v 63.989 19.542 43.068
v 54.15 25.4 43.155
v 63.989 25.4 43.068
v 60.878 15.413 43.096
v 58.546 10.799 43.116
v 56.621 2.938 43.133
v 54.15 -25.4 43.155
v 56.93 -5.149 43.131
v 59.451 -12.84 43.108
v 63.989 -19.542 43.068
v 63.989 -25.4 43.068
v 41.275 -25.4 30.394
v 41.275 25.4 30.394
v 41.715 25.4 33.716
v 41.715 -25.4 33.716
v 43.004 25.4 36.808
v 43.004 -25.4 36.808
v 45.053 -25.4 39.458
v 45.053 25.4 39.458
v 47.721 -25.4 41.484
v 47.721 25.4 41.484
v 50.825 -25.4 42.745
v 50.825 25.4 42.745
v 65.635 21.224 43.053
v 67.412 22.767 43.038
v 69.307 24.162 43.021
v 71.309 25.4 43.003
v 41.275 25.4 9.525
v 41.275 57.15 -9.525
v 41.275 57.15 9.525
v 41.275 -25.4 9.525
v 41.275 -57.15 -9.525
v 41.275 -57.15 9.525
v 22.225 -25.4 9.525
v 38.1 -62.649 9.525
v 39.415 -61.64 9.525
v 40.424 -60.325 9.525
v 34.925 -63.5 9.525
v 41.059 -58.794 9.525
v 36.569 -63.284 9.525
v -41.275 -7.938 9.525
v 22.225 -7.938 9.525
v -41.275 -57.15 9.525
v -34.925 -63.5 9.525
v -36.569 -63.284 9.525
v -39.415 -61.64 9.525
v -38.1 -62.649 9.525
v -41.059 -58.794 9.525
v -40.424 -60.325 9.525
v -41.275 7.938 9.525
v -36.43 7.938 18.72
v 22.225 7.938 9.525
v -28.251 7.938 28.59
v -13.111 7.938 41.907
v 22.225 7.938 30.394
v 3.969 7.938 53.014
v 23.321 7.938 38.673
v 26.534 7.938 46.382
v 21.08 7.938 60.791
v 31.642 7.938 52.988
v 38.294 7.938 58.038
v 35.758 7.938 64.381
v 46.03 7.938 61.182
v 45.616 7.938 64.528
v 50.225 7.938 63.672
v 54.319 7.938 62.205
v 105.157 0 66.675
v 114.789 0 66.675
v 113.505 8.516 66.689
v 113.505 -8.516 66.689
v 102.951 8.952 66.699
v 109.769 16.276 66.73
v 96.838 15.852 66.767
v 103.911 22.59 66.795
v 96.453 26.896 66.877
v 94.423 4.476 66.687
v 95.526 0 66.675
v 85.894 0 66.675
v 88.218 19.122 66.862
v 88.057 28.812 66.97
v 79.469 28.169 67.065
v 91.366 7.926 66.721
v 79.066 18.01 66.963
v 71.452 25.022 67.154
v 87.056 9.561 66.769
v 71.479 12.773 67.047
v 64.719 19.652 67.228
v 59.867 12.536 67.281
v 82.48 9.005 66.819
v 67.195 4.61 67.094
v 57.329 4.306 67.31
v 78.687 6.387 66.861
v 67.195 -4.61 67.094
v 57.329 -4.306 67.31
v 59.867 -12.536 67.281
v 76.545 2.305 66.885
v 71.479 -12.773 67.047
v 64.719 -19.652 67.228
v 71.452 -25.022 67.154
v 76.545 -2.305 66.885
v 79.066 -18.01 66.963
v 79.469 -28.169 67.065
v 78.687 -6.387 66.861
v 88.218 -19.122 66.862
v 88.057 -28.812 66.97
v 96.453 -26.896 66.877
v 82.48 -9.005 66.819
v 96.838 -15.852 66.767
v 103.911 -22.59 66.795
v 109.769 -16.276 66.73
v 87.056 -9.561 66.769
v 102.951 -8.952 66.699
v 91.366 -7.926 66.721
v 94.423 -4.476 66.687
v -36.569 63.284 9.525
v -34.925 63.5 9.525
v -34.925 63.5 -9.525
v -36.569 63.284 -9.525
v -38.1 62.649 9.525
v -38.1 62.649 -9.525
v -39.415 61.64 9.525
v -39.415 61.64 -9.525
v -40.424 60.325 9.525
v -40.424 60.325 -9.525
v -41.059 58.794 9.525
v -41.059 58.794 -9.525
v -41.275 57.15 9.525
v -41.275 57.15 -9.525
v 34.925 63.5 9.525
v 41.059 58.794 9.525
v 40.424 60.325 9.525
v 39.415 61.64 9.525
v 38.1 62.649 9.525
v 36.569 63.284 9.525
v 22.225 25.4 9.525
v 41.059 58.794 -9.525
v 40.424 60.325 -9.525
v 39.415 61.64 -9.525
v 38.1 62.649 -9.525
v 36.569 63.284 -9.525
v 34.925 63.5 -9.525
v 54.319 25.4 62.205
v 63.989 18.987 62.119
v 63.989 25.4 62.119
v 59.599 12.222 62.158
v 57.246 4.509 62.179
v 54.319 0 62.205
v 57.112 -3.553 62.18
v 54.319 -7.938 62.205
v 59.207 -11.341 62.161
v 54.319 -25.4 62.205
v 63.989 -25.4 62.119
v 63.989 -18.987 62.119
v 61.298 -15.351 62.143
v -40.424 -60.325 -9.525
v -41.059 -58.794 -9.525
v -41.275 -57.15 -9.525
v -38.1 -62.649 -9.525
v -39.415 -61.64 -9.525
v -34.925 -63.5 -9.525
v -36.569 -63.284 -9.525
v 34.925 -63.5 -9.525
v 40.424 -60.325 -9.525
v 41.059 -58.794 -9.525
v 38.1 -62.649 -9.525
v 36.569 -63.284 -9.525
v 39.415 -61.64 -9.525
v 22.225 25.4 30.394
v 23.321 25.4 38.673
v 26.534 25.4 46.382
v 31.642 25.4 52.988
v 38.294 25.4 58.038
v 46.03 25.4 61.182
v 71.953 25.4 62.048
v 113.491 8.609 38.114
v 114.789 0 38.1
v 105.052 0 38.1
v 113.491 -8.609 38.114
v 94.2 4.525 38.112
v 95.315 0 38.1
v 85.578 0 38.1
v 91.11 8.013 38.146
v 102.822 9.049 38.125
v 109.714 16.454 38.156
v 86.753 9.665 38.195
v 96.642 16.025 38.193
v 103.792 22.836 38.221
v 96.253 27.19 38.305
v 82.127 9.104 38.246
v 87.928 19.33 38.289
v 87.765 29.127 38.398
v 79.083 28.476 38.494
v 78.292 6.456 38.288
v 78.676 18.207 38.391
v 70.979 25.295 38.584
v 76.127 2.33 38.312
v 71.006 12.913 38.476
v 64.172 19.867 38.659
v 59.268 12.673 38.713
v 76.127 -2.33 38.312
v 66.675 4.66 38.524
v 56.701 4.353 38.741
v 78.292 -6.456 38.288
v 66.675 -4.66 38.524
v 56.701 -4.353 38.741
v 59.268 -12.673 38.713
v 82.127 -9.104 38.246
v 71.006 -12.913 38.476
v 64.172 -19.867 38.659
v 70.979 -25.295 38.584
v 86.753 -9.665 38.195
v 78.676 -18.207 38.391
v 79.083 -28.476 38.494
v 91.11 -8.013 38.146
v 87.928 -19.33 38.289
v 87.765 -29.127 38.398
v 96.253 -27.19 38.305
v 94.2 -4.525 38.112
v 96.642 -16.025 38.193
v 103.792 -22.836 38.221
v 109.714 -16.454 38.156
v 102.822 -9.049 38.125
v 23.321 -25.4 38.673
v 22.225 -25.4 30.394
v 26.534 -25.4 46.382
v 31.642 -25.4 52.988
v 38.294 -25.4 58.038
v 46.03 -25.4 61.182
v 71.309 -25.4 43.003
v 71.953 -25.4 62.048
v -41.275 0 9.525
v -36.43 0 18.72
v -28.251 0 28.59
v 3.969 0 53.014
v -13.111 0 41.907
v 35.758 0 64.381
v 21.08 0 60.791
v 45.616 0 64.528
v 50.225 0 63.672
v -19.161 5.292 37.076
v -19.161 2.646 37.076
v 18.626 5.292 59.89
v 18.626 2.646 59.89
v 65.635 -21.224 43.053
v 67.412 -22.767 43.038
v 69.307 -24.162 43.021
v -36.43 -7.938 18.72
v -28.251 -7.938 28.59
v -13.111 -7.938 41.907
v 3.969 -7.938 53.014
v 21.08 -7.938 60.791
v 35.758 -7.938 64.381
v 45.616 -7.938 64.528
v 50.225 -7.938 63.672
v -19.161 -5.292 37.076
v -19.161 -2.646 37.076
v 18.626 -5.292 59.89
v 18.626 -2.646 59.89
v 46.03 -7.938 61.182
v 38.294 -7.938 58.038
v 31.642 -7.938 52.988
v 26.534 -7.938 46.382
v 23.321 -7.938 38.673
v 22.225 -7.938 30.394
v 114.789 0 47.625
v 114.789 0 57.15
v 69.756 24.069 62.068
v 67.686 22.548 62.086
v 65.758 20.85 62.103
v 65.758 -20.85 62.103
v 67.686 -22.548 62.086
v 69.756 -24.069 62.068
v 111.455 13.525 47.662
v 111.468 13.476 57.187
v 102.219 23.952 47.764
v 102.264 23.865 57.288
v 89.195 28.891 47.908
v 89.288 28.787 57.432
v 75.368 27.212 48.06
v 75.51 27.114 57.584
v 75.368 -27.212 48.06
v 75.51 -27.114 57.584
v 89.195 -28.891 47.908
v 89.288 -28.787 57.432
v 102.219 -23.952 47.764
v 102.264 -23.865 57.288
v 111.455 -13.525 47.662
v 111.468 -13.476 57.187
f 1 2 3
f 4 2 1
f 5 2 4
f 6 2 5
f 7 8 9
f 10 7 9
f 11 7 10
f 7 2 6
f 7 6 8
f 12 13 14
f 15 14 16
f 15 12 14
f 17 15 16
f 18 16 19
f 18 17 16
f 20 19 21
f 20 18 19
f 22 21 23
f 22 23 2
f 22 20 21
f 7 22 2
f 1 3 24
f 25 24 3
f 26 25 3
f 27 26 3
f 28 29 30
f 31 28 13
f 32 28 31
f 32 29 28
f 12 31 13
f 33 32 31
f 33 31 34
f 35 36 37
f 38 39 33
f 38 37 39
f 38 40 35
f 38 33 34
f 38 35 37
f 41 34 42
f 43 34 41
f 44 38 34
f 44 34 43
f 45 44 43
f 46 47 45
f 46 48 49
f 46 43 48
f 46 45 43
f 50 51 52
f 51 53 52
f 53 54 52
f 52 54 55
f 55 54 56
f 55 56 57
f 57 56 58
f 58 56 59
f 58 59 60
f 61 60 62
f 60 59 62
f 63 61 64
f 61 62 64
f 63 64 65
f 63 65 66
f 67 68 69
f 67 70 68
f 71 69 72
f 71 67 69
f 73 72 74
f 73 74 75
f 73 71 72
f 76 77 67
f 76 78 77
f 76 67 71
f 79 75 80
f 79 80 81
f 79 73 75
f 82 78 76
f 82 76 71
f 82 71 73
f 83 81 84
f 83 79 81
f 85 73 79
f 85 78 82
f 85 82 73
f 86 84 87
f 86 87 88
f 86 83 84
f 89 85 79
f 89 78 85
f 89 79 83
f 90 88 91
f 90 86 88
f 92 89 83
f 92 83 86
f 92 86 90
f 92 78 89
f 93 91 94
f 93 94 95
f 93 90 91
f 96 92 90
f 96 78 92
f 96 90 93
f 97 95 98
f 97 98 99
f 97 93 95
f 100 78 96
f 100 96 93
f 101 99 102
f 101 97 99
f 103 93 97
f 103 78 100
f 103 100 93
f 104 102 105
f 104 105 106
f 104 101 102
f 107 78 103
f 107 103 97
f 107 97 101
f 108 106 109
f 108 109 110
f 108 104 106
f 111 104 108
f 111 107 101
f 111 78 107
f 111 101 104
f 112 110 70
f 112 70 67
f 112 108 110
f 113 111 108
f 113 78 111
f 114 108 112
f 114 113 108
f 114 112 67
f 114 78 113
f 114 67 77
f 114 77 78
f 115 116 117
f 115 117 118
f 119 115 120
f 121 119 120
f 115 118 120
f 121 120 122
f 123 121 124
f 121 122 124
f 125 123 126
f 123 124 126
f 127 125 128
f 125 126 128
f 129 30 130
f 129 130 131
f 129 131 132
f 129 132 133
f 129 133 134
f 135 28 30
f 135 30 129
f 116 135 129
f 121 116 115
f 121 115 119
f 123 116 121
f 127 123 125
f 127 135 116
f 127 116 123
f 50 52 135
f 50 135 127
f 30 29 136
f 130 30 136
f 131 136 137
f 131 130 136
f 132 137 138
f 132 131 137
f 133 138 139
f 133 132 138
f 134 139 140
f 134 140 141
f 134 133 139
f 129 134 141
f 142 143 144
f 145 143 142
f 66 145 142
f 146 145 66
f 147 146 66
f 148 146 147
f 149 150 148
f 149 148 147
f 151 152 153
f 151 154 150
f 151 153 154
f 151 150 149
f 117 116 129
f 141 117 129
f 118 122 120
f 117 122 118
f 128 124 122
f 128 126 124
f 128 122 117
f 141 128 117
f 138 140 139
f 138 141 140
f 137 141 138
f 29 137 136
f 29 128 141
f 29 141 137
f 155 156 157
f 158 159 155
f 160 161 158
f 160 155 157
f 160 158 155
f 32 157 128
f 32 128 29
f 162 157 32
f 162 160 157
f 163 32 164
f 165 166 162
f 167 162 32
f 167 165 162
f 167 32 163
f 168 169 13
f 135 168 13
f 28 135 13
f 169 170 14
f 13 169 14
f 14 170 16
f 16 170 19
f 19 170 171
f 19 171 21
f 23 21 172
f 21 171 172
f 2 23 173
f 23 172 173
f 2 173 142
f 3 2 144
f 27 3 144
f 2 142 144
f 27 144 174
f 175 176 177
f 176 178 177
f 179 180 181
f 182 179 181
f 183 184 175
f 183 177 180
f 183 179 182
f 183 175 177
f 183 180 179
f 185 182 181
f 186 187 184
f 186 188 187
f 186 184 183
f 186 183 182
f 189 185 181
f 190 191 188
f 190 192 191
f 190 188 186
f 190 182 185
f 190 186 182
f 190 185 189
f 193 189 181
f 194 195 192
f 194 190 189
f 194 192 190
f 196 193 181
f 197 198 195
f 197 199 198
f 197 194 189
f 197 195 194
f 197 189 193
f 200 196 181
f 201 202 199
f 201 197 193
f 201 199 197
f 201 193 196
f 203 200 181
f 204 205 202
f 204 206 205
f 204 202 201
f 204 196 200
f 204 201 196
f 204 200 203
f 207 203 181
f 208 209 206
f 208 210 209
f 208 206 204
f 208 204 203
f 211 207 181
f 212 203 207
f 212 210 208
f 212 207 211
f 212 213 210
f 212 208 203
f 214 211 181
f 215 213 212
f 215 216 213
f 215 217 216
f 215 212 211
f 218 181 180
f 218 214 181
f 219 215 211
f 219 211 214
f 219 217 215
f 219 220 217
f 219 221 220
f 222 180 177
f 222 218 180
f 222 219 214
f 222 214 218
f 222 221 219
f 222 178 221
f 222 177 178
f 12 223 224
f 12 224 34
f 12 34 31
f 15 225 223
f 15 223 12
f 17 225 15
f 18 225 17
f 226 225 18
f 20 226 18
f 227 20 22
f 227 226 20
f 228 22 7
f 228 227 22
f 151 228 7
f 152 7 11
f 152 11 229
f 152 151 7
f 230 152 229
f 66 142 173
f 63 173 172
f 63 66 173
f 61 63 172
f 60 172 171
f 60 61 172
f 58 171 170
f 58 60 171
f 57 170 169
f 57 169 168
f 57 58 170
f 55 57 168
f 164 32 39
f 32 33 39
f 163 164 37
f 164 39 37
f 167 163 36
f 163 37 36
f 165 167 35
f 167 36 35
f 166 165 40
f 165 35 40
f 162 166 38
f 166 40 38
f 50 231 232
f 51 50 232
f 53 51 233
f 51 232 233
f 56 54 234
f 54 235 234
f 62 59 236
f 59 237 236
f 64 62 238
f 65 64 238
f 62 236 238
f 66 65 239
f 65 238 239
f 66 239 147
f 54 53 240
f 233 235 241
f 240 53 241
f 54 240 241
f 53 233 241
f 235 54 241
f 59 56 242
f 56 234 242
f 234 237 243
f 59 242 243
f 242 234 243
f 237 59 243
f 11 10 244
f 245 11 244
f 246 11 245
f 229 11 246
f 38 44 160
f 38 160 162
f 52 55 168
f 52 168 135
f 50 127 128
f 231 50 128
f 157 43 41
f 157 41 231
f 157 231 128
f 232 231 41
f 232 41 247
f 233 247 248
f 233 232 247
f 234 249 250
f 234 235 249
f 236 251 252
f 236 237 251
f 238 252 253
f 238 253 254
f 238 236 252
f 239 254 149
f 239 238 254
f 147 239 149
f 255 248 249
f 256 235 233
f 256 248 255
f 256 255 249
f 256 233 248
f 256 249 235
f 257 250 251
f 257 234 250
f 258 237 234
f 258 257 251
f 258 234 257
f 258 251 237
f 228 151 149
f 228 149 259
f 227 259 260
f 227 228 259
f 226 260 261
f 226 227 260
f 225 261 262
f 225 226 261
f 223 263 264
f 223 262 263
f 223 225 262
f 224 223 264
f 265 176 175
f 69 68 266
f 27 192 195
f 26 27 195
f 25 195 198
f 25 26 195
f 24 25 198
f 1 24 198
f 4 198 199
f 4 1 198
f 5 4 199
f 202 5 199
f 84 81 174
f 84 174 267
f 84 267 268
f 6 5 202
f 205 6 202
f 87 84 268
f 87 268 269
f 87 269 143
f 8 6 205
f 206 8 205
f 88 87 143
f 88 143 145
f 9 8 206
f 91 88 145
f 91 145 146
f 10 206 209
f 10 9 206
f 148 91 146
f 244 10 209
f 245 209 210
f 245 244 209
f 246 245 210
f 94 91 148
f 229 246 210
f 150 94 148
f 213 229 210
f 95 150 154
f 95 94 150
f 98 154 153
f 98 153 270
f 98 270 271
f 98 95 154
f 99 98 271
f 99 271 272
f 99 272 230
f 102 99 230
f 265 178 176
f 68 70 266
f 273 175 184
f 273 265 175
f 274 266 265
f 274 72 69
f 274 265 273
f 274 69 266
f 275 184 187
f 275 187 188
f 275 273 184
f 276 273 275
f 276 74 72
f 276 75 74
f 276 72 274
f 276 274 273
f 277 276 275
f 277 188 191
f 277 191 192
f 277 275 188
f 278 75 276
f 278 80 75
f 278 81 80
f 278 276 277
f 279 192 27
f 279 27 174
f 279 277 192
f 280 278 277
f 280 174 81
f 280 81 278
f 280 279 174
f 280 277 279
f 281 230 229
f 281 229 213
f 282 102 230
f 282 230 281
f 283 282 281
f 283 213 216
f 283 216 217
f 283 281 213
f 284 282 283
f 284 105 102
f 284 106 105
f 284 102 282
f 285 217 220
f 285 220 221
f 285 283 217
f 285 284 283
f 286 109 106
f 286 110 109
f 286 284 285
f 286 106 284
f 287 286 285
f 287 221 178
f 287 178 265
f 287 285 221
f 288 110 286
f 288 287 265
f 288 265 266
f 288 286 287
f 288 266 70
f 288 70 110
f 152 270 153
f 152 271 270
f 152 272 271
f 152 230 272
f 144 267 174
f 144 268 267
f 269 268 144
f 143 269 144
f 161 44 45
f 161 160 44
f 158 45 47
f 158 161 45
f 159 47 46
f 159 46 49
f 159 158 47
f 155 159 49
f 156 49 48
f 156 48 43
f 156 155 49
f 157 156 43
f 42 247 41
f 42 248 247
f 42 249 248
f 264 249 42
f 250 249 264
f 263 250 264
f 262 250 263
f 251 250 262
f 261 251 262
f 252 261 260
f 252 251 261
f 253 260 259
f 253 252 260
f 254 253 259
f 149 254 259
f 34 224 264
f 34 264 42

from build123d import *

# Parameters (mm, degrees)
F1_DEPTH = 63.5
F2_DEPTH = 25.4
F3_DEPTH = 7.9375
F5_R     = 6.35


with BuildPart() as f1:
    # F0 (on Front) → F1 (new body, symmetric)
    with BuildSketch(Plane.XZ):
        Polygon((41.275, -9.525), (41.275, 9.525), (22.225, 9.525), (-41.275, 9.525), (-41.275, -9.525), align=None)
    extrude(amount=F1_DEPTH, both=True)

    # F0 (on Front) → F2 (join, symmetric)
    with BuildSketch(Plane.XZ):
        Polygon((63.9889016747, 62.1188126437), (63.9889016747, 43.0680627667), (85.6312127138, 42.8760321675), (85.8415678118, 61.9249155796), align=None)
        with BuildLine():
            Line((22.225, 9.525), (41.275, 9.525))
            Line((41.275, 9.525), (41.275, 30.394497076))
            ThreePointArc((41.275, 30.394497076), (45.0528398589, 39.4580924516), (54.1495976422, 43.1553661719))
            Line((54.1495976422, 43.1553661719), (63.9889016747, 43.0680627667))
            Line((63.9889016747, 43.0680627667), (63.9889016747, 62.1188126437))
            Line((63.9889016747, 62.1188126437), (54.3186202071, 62.2046163244))
            ThreePointArc((54.3186202071, 62.2046163244), (31.6423473224, 52.9881031659), (22.225, 30.394497076))
            Line((22.225, 30.394497076), (22.225, 9.525))
        make_face()
    extrude(amount=F2_DEPTH, both=True)

    # F0 (on Front) → F3 (join, symmetric)
    with BuildSketch(Plane.XZ):
        with BuildLine():
            Line((-41.275, 9.525), (22.225, 9.525))
            Line((22.225, 9.525), (22.225, 30.394497076))
            ThreePointArc((22.225, 30.394497076), (31.6423473224, 52.9881031659), (54.3186202071, 62.2046163244))
            add(Edge.make_bspline(
                [(-41.275, 9.525), (-32.9198464751, 34.1910012066), (25.594945997, 75.3937736154), (54.3186202071, 62.2046163244)],
                knots=[0, 0, 0, 0, 109.1479830339, 109.1479830339, 109.1479830339, 109.1479830339], degree=3))
        make_face()
    extrude(amount=F3_DEPTH, both=True)

    # F0 (on Front) → F4 (revolve)
    with BuildSketch(Plane.XZ):
        Polygon((85.8415678118, 61.9249155796), (85.6312127138, 42.8760321675), (85.5784714222, 38.1), (114.7889016747, 38.1), (114.7889016747, 66.675), (85.8940225648, 66.675), align=None)
    revolve(axis=Axis((85.7362469935, 0, 52.3875), (0.0110422364, 0, 0.9999390326)))

    # F5
    f5_edges = [f1.edges().sort_by_distance(p)[0] for p in [
        (-41.275, -63.5, 0),
        (41.275, -63.5, 0),
        (41.275, 63.5, 0),
        (-41.275, 63.5, 0),
    ]]
    fillet(f5_edges, radius=F5_R)


solid = f1.part
